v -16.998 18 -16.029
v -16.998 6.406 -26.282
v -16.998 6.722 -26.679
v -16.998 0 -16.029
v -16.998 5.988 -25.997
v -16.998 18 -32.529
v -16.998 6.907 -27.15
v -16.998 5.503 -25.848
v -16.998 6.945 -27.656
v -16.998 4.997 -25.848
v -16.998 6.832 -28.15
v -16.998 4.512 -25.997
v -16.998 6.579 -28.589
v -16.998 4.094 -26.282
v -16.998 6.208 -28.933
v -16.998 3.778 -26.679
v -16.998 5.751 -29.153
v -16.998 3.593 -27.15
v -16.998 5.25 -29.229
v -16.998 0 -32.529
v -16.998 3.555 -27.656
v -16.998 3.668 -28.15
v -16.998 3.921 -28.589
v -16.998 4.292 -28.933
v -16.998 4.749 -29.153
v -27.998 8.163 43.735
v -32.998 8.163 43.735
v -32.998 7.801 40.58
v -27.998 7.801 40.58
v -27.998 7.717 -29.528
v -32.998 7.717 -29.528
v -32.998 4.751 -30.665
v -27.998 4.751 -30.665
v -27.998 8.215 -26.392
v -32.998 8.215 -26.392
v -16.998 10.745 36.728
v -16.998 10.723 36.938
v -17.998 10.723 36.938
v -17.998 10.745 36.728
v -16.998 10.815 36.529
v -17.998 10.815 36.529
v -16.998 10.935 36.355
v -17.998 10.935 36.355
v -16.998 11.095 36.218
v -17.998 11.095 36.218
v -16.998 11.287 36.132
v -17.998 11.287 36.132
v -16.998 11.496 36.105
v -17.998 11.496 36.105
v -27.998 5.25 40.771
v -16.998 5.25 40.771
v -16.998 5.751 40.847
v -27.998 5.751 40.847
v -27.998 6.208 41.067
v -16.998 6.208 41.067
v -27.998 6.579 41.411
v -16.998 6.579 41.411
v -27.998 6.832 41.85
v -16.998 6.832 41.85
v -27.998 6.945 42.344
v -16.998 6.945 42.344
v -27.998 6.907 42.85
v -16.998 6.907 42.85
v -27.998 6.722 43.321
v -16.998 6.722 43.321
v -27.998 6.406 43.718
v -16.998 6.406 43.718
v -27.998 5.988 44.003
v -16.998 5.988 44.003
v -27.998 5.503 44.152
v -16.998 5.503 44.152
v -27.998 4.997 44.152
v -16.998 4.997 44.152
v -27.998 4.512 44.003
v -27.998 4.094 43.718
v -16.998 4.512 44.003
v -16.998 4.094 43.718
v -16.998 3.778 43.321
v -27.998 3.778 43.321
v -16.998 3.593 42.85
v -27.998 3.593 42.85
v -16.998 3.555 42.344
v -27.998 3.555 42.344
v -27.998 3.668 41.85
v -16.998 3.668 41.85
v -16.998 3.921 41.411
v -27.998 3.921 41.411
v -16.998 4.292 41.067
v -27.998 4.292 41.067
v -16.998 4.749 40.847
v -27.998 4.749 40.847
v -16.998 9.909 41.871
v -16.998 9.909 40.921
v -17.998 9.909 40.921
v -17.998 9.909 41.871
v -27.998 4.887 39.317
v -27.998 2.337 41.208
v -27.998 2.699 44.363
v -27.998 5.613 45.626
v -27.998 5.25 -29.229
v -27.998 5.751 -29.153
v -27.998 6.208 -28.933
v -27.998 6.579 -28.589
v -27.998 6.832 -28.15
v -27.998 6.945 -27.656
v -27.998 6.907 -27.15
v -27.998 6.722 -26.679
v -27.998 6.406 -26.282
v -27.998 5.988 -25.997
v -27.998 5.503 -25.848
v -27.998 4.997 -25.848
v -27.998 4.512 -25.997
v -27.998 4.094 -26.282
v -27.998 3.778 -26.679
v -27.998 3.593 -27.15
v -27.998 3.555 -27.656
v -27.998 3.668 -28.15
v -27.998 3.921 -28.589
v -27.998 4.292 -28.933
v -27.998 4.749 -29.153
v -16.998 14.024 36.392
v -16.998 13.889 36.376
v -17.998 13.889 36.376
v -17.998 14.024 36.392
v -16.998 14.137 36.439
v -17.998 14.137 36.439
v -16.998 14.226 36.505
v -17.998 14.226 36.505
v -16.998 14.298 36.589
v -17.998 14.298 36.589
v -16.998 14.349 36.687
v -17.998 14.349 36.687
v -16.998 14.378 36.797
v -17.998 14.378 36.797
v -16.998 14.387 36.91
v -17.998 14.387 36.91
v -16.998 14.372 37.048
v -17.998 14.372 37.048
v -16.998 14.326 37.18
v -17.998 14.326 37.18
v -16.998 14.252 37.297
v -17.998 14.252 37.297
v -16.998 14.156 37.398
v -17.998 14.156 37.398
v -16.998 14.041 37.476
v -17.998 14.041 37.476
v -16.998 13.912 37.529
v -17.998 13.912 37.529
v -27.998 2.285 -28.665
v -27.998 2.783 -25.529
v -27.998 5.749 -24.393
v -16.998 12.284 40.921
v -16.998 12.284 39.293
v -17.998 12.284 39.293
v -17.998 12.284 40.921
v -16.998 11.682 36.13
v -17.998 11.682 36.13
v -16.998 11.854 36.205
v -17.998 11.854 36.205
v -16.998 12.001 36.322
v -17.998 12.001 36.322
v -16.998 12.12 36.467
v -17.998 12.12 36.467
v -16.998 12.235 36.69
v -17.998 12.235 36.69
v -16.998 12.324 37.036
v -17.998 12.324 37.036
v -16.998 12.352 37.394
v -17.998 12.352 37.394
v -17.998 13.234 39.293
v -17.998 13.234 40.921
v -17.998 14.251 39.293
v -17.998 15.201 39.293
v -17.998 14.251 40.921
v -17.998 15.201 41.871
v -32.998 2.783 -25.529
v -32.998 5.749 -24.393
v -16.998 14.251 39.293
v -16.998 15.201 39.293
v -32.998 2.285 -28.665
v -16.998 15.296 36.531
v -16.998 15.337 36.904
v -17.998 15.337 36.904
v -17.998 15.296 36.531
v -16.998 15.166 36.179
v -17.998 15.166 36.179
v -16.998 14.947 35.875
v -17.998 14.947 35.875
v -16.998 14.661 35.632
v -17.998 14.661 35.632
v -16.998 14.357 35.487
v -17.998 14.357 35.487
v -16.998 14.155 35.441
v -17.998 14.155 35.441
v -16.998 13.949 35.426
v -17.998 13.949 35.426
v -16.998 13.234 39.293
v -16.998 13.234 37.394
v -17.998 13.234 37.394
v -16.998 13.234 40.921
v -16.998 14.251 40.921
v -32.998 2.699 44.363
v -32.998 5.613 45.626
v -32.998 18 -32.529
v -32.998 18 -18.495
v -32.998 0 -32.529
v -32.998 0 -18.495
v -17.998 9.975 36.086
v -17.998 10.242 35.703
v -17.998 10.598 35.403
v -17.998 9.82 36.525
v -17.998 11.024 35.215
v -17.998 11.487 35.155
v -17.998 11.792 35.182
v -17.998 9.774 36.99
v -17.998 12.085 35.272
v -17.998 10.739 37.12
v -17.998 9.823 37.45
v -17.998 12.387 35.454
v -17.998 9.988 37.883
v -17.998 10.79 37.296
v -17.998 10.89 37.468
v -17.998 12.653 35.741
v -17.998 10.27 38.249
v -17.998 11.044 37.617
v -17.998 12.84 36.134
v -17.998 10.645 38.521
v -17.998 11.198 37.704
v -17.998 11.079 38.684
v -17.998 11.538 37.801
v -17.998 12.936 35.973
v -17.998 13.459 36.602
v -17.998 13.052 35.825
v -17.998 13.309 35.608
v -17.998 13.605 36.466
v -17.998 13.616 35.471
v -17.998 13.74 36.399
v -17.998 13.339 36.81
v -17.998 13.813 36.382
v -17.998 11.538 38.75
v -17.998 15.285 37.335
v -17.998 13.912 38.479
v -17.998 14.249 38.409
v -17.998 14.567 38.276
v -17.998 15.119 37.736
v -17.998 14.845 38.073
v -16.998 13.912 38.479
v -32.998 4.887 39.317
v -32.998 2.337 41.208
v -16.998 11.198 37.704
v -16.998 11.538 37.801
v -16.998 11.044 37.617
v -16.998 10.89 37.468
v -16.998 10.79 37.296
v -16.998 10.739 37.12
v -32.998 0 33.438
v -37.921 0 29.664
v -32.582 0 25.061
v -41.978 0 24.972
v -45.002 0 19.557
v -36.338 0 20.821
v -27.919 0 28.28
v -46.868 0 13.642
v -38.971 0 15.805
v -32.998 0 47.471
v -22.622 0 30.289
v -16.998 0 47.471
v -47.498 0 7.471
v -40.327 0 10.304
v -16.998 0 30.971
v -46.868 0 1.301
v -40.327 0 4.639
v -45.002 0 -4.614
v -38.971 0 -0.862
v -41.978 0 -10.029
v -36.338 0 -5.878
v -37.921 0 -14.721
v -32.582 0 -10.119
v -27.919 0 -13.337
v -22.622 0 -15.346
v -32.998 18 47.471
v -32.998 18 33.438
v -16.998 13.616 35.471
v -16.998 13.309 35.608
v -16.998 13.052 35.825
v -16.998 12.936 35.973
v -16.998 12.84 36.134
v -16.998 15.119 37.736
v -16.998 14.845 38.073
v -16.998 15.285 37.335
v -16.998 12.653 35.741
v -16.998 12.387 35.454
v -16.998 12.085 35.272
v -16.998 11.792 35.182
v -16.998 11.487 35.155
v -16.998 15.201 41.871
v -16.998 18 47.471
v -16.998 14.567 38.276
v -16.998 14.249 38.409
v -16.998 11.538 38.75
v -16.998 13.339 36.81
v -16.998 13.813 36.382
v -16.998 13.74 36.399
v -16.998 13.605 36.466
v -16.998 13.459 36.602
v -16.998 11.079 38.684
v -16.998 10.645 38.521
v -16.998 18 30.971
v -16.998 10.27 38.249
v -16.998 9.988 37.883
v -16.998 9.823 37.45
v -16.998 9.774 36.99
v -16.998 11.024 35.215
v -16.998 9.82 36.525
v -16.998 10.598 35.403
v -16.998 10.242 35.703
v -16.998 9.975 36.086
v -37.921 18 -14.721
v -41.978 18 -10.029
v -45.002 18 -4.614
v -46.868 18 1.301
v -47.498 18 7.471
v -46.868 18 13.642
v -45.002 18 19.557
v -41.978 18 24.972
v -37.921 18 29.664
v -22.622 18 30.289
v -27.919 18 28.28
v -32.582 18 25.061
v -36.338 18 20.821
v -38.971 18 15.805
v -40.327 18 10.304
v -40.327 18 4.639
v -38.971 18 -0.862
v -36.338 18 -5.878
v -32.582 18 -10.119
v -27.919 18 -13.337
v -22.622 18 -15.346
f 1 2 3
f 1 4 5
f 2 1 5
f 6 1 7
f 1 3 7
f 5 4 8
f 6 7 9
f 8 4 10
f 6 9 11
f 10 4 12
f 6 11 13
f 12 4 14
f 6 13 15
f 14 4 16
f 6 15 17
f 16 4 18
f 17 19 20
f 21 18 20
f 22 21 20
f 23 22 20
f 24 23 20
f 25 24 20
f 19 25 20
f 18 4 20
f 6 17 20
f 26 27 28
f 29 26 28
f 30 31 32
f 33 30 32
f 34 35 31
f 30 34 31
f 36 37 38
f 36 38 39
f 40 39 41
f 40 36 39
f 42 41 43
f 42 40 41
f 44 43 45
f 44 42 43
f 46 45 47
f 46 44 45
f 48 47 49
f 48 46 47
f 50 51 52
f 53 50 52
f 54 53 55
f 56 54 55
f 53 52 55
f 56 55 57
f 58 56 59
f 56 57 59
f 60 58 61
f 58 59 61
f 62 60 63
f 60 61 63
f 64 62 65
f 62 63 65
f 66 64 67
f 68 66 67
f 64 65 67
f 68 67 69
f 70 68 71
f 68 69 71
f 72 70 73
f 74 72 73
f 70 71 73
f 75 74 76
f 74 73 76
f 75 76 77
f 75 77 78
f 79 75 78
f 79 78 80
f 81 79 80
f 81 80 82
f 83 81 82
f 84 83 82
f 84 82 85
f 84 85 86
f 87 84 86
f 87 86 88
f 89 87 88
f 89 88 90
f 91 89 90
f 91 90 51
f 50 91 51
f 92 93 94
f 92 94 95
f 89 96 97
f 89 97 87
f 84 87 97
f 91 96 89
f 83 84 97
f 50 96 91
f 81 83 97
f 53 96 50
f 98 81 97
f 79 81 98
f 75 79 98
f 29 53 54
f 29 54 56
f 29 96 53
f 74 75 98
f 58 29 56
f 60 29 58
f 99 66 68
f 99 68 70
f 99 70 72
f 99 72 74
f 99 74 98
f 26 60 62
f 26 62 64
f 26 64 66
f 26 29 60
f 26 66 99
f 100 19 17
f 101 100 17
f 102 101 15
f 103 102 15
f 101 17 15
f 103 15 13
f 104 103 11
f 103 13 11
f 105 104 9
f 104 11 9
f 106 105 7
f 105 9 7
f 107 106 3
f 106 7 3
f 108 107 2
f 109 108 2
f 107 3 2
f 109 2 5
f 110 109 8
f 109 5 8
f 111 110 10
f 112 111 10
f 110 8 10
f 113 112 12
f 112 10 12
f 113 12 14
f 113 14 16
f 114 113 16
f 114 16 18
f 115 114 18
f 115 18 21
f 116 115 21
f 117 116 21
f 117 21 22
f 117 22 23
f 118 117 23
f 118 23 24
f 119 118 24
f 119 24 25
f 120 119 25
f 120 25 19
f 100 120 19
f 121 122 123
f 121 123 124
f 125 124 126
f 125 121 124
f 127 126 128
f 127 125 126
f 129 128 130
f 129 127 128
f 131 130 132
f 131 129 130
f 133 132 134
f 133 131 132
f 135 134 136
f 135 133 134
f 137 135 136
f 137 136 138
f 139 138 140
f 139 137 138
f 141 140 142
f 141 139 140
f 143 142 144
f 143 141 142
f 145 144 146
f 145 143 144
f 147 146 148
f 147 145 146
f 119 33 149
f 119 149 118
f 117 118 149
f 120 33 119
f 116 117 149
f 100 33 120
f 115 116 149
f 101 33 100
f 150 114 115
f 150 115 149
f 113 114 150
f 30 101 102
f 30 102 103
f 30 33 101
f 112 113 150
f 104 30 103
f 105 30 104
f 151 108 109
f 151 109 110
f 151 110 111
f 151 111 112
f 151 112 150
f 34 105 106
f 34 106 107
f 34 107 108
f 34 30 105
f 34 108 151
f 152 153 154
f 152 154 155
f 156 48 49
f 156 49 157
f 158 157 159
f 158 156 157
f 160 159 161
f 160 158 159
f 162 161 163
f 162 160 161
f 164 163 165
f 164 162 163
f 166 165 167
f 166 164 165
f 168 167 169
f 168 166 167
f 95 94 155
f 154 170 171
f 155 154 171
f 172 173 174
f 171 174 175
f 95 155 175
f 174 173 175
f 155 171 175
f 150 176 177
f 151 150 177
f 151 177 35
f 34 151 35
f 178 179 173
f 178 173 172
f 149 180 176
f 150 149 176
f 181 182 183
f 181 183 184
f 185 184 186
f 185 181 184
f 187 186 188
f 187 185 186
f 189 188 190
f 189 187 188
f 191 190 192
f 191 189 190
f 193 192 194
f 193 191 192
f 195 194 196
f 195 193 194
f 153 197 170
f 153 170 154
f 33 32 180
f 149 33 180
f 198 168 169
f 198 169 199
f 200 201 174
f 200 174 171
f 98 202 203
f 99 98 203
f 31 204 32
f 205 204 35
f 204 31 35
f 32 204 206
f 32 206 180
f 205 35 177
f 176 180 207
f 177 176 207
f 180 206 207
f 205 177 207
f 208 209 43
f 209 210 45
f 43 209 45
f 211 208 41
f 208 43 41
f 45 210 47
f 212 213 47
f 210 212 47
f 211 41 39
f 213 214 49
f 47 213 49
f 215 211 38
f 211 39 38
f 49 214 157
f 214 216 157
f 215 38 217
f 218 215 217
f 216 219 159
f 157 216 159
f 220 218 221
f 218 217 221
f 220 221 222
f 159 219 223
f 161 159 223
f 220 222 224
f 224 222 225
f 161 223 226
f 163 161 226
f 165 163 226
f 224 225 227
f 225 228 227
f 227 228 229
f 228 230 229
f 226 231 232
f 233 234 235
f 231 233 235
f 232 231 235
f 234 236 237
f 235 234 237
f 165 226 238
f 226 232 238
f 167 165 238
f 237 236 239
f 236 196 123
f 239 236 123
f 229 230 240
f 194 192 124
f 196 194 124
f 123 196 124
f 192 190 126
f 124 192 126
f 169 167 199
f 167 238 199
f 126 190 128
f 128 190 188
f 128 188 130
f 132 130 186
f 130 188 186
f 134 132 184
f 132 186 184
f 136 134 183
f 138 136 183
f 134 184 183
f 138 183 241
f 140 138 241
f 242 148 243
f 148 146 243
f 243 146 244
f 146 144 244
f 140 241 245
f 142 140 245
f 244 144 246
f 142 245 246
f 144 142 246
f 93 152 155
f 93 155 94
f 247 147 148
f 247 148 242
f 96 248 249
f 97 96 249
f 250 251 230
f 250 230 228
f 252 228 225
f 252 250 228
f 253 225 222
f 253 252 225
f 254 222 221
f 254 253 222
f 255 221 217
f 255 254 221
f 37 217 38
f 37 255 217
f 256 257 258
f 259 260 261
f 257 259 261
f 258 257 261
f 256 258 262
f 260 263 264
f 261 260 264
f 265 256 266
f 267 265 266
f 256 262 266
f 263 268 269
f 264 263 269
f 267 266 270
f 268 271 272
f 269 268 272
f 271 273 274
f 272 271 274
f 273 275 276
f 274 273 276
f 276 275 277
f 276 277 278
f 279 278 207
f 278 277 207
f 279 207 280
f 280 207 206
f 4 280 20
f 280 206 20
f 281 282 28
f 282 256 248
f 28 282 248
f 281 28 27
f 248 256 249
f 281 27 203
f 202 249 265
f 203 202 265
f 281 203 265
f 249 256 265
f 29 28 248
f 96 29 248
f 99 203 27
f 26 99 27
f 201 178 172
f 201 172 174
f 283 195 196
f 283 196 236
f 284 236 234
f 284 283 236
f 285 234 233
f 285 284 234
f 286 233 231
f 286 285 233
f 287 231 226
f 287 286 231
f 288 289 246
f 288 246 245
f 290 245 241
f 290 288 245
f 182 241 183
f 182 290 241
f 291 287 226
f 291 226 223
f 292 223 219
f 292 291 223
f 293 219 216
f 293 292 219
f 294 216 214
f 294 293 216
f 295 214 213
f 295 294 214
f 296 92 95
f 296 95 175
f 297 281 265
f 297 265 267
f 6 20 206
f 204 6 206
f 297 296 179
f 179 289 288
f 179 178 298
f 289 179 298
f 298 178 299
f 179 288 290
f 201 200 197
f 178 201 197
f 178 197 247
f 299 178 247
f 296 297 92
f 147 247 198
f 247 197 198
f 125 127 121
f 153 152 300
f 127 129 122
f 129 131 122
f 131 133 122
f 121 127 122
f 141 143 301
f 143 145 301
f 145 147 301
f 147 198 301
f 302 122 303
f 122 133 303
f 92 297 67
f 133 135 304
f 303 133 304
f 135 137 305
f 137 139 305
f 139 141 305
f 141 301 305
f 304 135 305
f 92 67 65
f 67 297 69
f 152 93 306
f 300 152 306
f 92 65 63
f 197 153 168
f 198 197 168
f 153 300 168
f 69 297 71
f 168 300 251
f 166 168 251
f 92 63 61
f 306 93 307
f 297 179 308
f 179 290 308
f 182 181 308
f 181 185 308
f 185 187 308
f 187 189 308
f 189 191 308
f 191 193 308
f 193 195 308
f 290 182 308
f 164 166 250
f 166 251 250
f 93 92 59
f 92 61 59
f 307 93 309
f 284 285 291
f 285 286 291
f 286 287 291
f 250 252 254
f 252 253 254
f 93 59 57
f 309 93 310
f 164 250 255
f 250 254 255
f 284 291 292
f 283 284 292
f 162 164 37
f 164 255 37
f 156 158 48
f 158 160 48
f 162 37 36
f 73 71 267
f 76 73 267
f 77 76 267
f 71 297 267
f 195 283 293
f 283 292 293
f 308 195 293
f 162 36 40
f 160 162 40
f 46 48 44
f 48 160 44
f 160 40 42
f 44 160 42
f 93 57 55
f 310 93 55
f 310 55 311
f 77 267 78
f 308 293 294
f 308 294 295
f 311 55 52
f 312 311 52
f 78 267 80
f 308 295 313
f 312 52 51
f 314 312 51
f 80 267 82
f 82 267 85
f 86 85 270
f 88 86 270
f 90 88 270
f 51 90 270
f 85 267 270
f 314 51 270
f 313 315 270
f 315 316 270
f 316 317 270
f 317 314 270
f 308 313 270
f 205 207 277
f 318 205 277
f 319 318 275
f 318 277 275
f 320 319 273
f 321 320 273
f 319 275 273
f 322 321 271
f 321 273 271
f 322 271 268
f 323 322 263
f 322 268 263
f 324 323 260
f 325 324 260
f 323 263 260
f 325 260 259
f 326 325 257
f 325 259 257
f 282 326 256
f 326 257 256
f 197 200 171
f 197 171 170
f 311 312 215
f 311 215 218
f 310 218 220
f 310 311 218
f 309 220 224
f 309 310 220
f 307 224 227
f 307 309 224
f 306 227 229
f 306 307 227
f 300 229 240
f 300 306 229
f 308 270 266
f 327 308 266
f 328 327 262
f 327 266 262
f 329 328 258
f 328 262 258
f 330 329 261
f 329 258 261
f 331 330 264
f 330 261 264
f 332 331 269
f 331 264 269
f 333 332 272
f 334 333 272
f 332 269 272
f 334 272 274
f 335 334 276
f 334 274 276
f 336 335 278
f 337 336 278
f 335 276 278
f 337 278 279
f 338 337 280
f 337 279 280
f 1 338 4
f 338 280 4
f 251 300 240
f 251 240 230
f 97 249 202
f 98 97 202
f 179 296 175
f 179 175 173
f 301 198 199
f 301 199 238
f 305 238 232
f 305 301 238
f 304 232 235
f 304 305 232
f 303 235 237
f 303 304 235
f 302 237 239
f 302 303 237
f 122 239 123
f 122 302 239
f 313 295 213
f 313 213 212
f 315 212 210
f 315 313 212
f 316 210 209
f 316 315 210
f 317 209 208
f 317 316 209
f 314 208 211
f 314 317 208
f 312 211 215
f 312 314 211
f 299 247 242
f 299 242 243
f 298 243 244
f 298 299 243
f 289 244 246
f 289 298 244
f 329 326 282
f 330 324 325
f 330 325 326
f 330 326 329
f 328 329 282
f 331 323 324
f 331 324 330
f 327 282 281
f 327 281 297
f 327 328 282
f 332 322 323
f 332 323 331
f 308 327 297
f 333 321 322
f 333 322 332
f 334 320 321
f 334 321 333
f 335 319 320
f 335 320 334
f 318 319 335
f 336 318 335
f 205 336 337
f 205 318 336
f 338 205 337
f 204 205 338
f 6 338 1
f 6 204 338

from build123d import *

# Parameters (mm, degrees)
BOSS_EXTRUDE1_DEPTH = 18
SKETCH2_R           = 1.7
CUT_EXTRUDE1_DEPTH  = 31.5
CUT_EXTRUDE2_DEPTH  = 1
CUT_EXTRUDE3_DEPTH  = 5


with BuildPart() as part:
    # Sketch1 → Boss-Extrude1 (new body)
    with BuildSketch(Plane(origin=(0, 0, 0), x_dir=(1, 0, 0), z_dir=(0, 1, 0))):
        with BuildLine():
            Line((-16.998275301, 32.528571429), (-32.998275301, 32.528571429))
            Line((-32.998275301, 32.528571429), (-32.998275301, 18.494895774))
            ThreePointArc((-32.998275301, 18.494895774), (-47.498275301, -7.471428571), (-32.998275301, -33.437752917))
            Line((-32.998275301, -33.437752917), (-32.998275301, -47.471428571))
            Line((-32.998275301, -47.471428571), (-16.998275301, -47.471428571))
            Line((-16.998275301, -47.471428571), (-16.998275301, -30.971428571))
            ThreePointArc((-16.998275301, -30.971428571), (-40.498275301, -7.471428571), (-16.998275301, 16.028571429))
            Line((-16.998275301, 16.028571429), (-16.998275301, 32.528571429))
        make_face()
    extrude(amount=BOSS_EXTRUDE1_DEPTH)

    # Sketch2 → Cut-Extrude1 (cut, through all)
    with BuildSketch(Plane(origin=(-16.998275301, 0, 0), x_dir=(0, 0, -1), z_dir=(1, 0, 0))):
        with Locations((-42.471428571, 5.25)):
            Circle(SKETCH2_R)
        with Locations((27.528571429, 5.25)):
            Circle(SKETCH2_R)
    extrude(amount=-CUT_EXTRUDE1_DEPTH, mode=Mode.SUBTRACT)

    # Sketch3 → Cut-Extrude2 (cut)
    with BuildSketch(Plane(origin=(-16.998275301, 0, 0), x_dir=(0, 0, -1), z_dir=(1, 0, 0))):
        Polygon((-41.871148795, 15.201025034), (-39.293157342, 15.201025034), (-39.293157342, 14.251238709), (-40.92136247, 14.251238709), (-40.92136247, 13.233610504), (-39.293157342, 13.233610504), (-39.293157342, 12.283824179), (-40.92136247, 12.283824179), (-40.92136247, 9.909358367), (-41.871148795, 9.909358367), align=None)
        with BuildLine():
            Line((-37.529268453, 13.912029308), (-38.479054777, 13.912029308))
            add(Edge.make_bspline(
                [(-38.479054777, 13.912029308), (-38.472348925, 13.959505738), (-38.459202545, 14.052580134), (-38.427745016, 14.187328674), (-38.390118416, 14.315146885), (-38.34314353, 14.435629995), (-38.288049629, 14.548992623), (-38.225396959, 14.655623774), (-38.154508221, 14.755065768), (-38.100171252, 14.814970019), (-38.073063525, 14.844855162)],
                knots=[0, 0, 0, 0, 0.000143778, 0.000281867, 0.000414671, 0.000543215, 0.000669322, 0.0007924, 0.000913902, 0.001034861, 0.001034861, 0.001034861, 0.001034861], degree=3))
            add(Edge.make_bspline(
                [(-38.073063525, 14.844855162), (-38.033964221, 14.884286443), (-37.956903602, 14.962001353), (-37.82812627, 15.061545568), (-37.693143844, 15.147694317), (-37.549249192, 15.215993668), (-37.398681424, 15.27127408), (-37.240243172, 15.308406058), (-37.074581872, 15.333043453), (-36.961538875, 15.335470322), (-36.903851118, 15.336708795)],
                knots=[0, 0, 0, 0, 0.000166428, 0.000328012, 0.000487119, 0.000645947, 0.000804887, 0.000967376, 0.001133328, 0.001306272, 0.001306272, 0.001306272, 0.001306272], degree=3))
            add(Edge.make_bspline(
                [(-36.903851118, 15.336708795), (-36.852563734, 15.335498), (-36.751743072, 15.333117822), (-36.603562067, 15.314011042), (-36.462283879, 15.280499879), (-36.326415158, 15.236684784), (-36.197954088, 15.177067025), (-36.07406541, 15.107863497), (-35.958210577, 15.022982493), (-35.850118512, 14.927075501), (-35.750815335, 14.8233427), (-35.664818348, 14.712460867), (-35.590885195, 14.597391911), (-35.529974057, 14.477179826), (-35.483141668, 14.3516212), (-35.450638602, 14.221441367), (-35.429364556, 14.08692758), (-35.427245105, 13.99550037), (-35.426170162, 13.949130336)],
                knots=[0, 0, 0, 0, 0.000153836, 0.00030241, 0.000447173, 0.000588968, 0.00072986, 0.000871333, 0.001014032, 0.001159723, 0.001304436, 0.001444171, 0.001580024, 0.001714184, 0.00184768, 0.001981114, 0.002116187, 0.002255197, 0.002255197, 0.002255197, 0.002255197], degree=3))
            add(Edge.make_bspline(
                [(-35.426170162, 13.949130336), (-35.428376009, 13.89170491), (-35.432718642, 13.778651902), (-35.468353097, 13.613190424), (-35.524130708, 13.454979724), (-35.604706892, 13.306233407), (-35.705447645, 13.167356277), (-35.829053175, 13.042991412), (-35.972002875, 12.931188942), (-36.079317119, 12.87110628), (-36.134269788, 12.840339604)],
                knots=[0, 0, 0, 0, 0.00017212, 0.000338852, 0.000505492, 0.00067385, 0.000844528, 0.001018431, 0.001198237, 0.00138694, 0.00138694, 0.00138694, 0.00138694], degree=3))
            add(Edge.make_bspline(
                [(-36.134269788, 12.840339604), (-36.096551119, 12.827955771), (-36.022435626, 12.803622094), (-35.917089364, 12.755697192), (-35.816917106, 12.703323219), (-35.723643783, 12.642478468), (-35.636341679, 12.575623232), (-35.555542998, 12.502186007), (-35.480764986, 12.422326922), (-35.413228364, 12.335606781), (-35.353286974, 12.243412505), (-35.299504756, 12.147873726), (-35.255238993, 12.047541582), (-35.21774038, 11.943561934), (-35.189191072, 11.835000267), (-35.169089807, 11.722277248), (-35.157470783, 11.605650007), (-35.155698684, 11.526635122), (-35.154802641, 11.486682085)],
                knots=[0, 0, 0, 0, 0.000119012, 0.000233852, 0.000346714, 0.000457856, 0.00056747, 0.000676282, 0.000785032, 0.000895296, 0.001005549, 0.001114686, 0.001223822, 0.001334132, 0.001445978, 0.001560132, 0.001677317, 0.001797176, 0.001797176, 0.001797176, 0.001797176], degree=3))
            add(Edge.make_bspline(
                [(-35.154802641, 11.486682085), (-35.156619041, 11.427967343), (-35.160200611, 11.31219383), (-35.182970562, 11.141671293), (-35.225364107, 10.979093204), (-35.281135164, 10.822588857), (-35.355527701, 10.674178666), (-35.443075211, 10.53045682), (-35.55068869, 10.396407552), (-35.670282595, 10.268486948), (-35.803098598, 10.152187262), (-35.947092752, 10.051360668), (-36.09909875, 9.964833512), (-36.260078289, 9.8945883), (-36.429975443, 9.840491454), (-36.608411526, 9.801387759), (-36.796136276, 9.777463472), (-36.924273105, 9.774955464), (-36.989713498, 9.773674607)],
                knots=[0, 0, 0, 0, 0.000176169, 0.00034737, 0.00051474, 0.000679386, 0.000844836, 0.001011921, 0.001183269, 0.001359492, 0.001536793, 0.001711778, 0.001885991, 0.002060677, 0.00223768, 0.002420033, 0.00260805, 0.002804296, 0.002804296, 0.002804296, 0.002804296], degree=3))
            add(Edge.make_bspline(
                [(-36.989713498, 9.773674607), (-37.051619054, 9.775025054), (-37.172667177, 9.777665676), (-37.349725391, 9.800521596), (-37.518002464, 9.837390049), (-37.677927841, 9.889359191), (-37.828882784, 9.956754287), (-37.972236212, 10.037006724), (-38.105127537, 10.134745277), (-38.229037432, 10.245557842), (-38.341217201, 10.369883248), (-38.441479496, 10.504841559), (-38.527613517, 10.650945966), (-38.599972501, 10.80757225), (-38.657990763, 10.974995181), (-38.703755398, 11.152874295), (-38.735722744, 11.341557113), (-38.745458467, 11.471374906), (-38.750422299, 11.537563496)],
                knots=[0, 0, 0, 0, 0.000185653, 0.000363021, 0.000534566, 0.000701839, 0.000866512, 0.001029812, 0.001193709, 0.001360353, 0.001527707, 0.001695195, 0.001863902, 0.002035591, 0.002211932, 0.002394731, 0.002586078, 0.002785121, 0.002785121, 0.002785121, 0.002785121], degree=3))
            Line((-38.750422299, 11.537563496), (-37.800635974, 11.537563496))
            add(Edge.make_bspline(
                [(-37.800635974, 11.537563496), (-37.794617277, 11.504283004), (-37.782894287, 11.439460519), (-37.760029312, 11.345611971), (-37.730233061, 11.258983964), (-37.695781181, 11.178806552), (-37.658567964, 11.104027033), (-37.613605499, 11.037407199), (-37.564188399, 10.977138049), (-37.492879164, 10.905489419), (-37.3909377, 10.831873443), (-37.253282951, 10.767897658), (-37.100155079, 10.730399988), (-36.993103425, 10.725825387), (-36.937772058, 10.723460932)],
                knots=[0, 0, 0, 0, 0.000101453, 0.000197607, 0.000289457, 0.000375893, 0.000459333, 0.000539595, 0.000616416, 0.00069287, 0.00084235, 0.000990791, 0.001145821, 0.001311674, 0.001311674, 0.001311674, 0.001311674], degree=3))
            add(Edge.make_bspline(
                [(-36.937772058, 10.723460932), (-36.90841128, 10.72396442), (-36.850900082, 10.724950642), (-36.766424697, 10.735881586), (-36.685949998, 10.753884861), (-36.609326097, 10.778350644), (-36.536065202, 10.809020032), (-36.467567036, 10.848566373), (-36.402435434, 10.89454464), (-36.341378437, 10.946236417), (-36.284960514, 11.002561951), (-36.238017483, 11.06493291), (-36.19511495, 11.128312952), (-36.163383928, 11.196848623), (-36.135580716, 11.266851971), (-36.11856373, 11.340863899), (-36.105714684, 11.417331835), (-36.104967949, 11.469663134), (-36.104588966, 11.49622235)],
                knots=[0, 0, 0, 0, 8.804e-05, 0.00017245, 0.000255004, 0.000335125, 0.000413489, 0.000492771, 0.000571884, 0.000652369, 0.000732575, 0.000810392, 0.000886249, 0.00096163, 0.001036443, 0.001111772, 0.00118898, 0.001268546, 0.001268546, 0.001268546, 0.001268546], degree=3))
            add(Edge.make_bspline(
                [(-36.104588966, 11.49622235), (-36.105595096, 11.525269377), (-36.10759807, 11.583095353), (-36.123962582, 11.667480206), (-36.149805605, 11.748651634), (-36.18570472, 11.82625017), (-36.233643988, 11.899989803), (-36.290211789, 11.971349973), (-36.35986473, 12.036616511), (-36.436283336, 12.101130505), (-36.524898897, 12.15736725), (-36.621395711, 12.209265504), (-36.728309865, 12.250560491), (-36.843031489, 12.287444563), (-36.967730649, 12.314384117), (-37.101633011, 12.333944858), (-37.244522568, 12.348504799), (-37.343018198, 12.350593662), (-37.393584692, 12.35166606)],
                knots=[0, 0, 0, 0, 8.7084e-05, 0.000173364, 0.000256838, 0.000342201, 0.000428949, 0.000520167, 0.000614623, 0.000714788, 0.000819753, 0.000928812, 0.001042981, 0.001163003, 0.001290052, 0.001425126, 0.001568892, 0.001720568, 0.001720568, 0.001720568, 0.001720568], degree=3))
            Line((-37.393584692, 12.35166606), (-37.393584692, 13.233610504))
            add(Edge.make_bspline(
                [(-37.393584692, 13.233610504), (-37.330626399, 13.238972234), (-37.212843901, 13.249002968), (-37.049355478, 13.272460189), (-36.911719301, 13.303814627), (-36.796627281, 13.34164206), (-36.701062242, 13.390222338), (-36.617577152, 13.44385282), (-36.545675843, 13.506136787), (-36.484909592, 13.57521694), (-36.436298482, 13.649402546), (-36.40189437, 13.727540541), (-36.379175692, 13.80721324), (-36.377023099, 13.861706965), (-36.375956487, 13.888708661)],
                knots=[0, 0, 0, 0, 0.000189544, 0.000354599, 0.000494992, 0.000612655, 0.000716948, 0.000815736, 0.000909673, 0.001001315, 0.001090992, 0.001174513, 0.001256793, 0.001337606, 0.001337606, 0.001337606, 0.001337606], degree=3))
            add(Edge.make_bspline(
                [(-36.375956487, 13.888708661), (-36.377796698, 13.923159894), (-36.3813884, 13.990401408), (-36.409283508, 14.086638178), (-36.457706253, 14.172425283), (-36.522632653, 14.247582201), (-36.601747728, 14.310358892), (-36.694484465, 14.355933699), (-36.798830471, 14.382710933), (-36.872243509, 14.38548683), (-36.910211295, 14.38692247)],
                knots=[0, 0, 0, 0, 0.000103264, 0.00020155, 0.000297405, 0.00039663, 0.000497784, 0.000598286, 0.000704469, 0.000818208, 0.000818208, 0.000818208, 0.000818208], degree=3))
            add(Edge.make_bspline(
                [(-36.910211295, 14.38692247), (-36.944624824, 14.385228566), (-37.012911806, 14.381867343), (-37.112767812, 14.356780059), (-37.20759775, 14.314548739), (-37.295437959, 14.256314238), (-37.375020447, 14.18637707), (-37.440334709, 14.103551012), (-37.494660015, 14.012798316), (-37.517687082, 13.945750658), (-37.529268453, 13.912029308)],
                knots=[0, 0, 0, 0, 0.000103172, 0.000204725, 0.000306758, 0.000413189, 0.000519795, 0.000623097, 0.000728547, 0.000835248, 0.000835248, 0.000835248, 0.000835248], degree=3))
        make_face()
    extrude(amount=-CUT_EXTRUDE2_DEPTH, mode=Mode.SUBTRACT)

    # Sketch4 → Cut-Extrude3 (cut)
    with BuildSketch(Plane.ZY.offset(32.998275301)):
        Polygon((-25.528765418, 2.783401278), (-24.392531269, 5.748583447), (-26.39233728, 8.215182169), (-29.528377439, 7.716598722), (-30.664611588, 4.751416553), (-28.664805577, 2.284817831), align=None)
        Polygon((44.362800811, 2.699305117), (45.626081257, 5.612628966), (43.734709018, 8.163323849), (40.580056332, 7.800694883), (39.316775886, 4.887371034), (41.208148125, 2.336676151), align=None)
    extrude(amount=-CUT_EXTRUDE3_DEPTH, mode=Mode.SUBTRACT)


solid = part.part
